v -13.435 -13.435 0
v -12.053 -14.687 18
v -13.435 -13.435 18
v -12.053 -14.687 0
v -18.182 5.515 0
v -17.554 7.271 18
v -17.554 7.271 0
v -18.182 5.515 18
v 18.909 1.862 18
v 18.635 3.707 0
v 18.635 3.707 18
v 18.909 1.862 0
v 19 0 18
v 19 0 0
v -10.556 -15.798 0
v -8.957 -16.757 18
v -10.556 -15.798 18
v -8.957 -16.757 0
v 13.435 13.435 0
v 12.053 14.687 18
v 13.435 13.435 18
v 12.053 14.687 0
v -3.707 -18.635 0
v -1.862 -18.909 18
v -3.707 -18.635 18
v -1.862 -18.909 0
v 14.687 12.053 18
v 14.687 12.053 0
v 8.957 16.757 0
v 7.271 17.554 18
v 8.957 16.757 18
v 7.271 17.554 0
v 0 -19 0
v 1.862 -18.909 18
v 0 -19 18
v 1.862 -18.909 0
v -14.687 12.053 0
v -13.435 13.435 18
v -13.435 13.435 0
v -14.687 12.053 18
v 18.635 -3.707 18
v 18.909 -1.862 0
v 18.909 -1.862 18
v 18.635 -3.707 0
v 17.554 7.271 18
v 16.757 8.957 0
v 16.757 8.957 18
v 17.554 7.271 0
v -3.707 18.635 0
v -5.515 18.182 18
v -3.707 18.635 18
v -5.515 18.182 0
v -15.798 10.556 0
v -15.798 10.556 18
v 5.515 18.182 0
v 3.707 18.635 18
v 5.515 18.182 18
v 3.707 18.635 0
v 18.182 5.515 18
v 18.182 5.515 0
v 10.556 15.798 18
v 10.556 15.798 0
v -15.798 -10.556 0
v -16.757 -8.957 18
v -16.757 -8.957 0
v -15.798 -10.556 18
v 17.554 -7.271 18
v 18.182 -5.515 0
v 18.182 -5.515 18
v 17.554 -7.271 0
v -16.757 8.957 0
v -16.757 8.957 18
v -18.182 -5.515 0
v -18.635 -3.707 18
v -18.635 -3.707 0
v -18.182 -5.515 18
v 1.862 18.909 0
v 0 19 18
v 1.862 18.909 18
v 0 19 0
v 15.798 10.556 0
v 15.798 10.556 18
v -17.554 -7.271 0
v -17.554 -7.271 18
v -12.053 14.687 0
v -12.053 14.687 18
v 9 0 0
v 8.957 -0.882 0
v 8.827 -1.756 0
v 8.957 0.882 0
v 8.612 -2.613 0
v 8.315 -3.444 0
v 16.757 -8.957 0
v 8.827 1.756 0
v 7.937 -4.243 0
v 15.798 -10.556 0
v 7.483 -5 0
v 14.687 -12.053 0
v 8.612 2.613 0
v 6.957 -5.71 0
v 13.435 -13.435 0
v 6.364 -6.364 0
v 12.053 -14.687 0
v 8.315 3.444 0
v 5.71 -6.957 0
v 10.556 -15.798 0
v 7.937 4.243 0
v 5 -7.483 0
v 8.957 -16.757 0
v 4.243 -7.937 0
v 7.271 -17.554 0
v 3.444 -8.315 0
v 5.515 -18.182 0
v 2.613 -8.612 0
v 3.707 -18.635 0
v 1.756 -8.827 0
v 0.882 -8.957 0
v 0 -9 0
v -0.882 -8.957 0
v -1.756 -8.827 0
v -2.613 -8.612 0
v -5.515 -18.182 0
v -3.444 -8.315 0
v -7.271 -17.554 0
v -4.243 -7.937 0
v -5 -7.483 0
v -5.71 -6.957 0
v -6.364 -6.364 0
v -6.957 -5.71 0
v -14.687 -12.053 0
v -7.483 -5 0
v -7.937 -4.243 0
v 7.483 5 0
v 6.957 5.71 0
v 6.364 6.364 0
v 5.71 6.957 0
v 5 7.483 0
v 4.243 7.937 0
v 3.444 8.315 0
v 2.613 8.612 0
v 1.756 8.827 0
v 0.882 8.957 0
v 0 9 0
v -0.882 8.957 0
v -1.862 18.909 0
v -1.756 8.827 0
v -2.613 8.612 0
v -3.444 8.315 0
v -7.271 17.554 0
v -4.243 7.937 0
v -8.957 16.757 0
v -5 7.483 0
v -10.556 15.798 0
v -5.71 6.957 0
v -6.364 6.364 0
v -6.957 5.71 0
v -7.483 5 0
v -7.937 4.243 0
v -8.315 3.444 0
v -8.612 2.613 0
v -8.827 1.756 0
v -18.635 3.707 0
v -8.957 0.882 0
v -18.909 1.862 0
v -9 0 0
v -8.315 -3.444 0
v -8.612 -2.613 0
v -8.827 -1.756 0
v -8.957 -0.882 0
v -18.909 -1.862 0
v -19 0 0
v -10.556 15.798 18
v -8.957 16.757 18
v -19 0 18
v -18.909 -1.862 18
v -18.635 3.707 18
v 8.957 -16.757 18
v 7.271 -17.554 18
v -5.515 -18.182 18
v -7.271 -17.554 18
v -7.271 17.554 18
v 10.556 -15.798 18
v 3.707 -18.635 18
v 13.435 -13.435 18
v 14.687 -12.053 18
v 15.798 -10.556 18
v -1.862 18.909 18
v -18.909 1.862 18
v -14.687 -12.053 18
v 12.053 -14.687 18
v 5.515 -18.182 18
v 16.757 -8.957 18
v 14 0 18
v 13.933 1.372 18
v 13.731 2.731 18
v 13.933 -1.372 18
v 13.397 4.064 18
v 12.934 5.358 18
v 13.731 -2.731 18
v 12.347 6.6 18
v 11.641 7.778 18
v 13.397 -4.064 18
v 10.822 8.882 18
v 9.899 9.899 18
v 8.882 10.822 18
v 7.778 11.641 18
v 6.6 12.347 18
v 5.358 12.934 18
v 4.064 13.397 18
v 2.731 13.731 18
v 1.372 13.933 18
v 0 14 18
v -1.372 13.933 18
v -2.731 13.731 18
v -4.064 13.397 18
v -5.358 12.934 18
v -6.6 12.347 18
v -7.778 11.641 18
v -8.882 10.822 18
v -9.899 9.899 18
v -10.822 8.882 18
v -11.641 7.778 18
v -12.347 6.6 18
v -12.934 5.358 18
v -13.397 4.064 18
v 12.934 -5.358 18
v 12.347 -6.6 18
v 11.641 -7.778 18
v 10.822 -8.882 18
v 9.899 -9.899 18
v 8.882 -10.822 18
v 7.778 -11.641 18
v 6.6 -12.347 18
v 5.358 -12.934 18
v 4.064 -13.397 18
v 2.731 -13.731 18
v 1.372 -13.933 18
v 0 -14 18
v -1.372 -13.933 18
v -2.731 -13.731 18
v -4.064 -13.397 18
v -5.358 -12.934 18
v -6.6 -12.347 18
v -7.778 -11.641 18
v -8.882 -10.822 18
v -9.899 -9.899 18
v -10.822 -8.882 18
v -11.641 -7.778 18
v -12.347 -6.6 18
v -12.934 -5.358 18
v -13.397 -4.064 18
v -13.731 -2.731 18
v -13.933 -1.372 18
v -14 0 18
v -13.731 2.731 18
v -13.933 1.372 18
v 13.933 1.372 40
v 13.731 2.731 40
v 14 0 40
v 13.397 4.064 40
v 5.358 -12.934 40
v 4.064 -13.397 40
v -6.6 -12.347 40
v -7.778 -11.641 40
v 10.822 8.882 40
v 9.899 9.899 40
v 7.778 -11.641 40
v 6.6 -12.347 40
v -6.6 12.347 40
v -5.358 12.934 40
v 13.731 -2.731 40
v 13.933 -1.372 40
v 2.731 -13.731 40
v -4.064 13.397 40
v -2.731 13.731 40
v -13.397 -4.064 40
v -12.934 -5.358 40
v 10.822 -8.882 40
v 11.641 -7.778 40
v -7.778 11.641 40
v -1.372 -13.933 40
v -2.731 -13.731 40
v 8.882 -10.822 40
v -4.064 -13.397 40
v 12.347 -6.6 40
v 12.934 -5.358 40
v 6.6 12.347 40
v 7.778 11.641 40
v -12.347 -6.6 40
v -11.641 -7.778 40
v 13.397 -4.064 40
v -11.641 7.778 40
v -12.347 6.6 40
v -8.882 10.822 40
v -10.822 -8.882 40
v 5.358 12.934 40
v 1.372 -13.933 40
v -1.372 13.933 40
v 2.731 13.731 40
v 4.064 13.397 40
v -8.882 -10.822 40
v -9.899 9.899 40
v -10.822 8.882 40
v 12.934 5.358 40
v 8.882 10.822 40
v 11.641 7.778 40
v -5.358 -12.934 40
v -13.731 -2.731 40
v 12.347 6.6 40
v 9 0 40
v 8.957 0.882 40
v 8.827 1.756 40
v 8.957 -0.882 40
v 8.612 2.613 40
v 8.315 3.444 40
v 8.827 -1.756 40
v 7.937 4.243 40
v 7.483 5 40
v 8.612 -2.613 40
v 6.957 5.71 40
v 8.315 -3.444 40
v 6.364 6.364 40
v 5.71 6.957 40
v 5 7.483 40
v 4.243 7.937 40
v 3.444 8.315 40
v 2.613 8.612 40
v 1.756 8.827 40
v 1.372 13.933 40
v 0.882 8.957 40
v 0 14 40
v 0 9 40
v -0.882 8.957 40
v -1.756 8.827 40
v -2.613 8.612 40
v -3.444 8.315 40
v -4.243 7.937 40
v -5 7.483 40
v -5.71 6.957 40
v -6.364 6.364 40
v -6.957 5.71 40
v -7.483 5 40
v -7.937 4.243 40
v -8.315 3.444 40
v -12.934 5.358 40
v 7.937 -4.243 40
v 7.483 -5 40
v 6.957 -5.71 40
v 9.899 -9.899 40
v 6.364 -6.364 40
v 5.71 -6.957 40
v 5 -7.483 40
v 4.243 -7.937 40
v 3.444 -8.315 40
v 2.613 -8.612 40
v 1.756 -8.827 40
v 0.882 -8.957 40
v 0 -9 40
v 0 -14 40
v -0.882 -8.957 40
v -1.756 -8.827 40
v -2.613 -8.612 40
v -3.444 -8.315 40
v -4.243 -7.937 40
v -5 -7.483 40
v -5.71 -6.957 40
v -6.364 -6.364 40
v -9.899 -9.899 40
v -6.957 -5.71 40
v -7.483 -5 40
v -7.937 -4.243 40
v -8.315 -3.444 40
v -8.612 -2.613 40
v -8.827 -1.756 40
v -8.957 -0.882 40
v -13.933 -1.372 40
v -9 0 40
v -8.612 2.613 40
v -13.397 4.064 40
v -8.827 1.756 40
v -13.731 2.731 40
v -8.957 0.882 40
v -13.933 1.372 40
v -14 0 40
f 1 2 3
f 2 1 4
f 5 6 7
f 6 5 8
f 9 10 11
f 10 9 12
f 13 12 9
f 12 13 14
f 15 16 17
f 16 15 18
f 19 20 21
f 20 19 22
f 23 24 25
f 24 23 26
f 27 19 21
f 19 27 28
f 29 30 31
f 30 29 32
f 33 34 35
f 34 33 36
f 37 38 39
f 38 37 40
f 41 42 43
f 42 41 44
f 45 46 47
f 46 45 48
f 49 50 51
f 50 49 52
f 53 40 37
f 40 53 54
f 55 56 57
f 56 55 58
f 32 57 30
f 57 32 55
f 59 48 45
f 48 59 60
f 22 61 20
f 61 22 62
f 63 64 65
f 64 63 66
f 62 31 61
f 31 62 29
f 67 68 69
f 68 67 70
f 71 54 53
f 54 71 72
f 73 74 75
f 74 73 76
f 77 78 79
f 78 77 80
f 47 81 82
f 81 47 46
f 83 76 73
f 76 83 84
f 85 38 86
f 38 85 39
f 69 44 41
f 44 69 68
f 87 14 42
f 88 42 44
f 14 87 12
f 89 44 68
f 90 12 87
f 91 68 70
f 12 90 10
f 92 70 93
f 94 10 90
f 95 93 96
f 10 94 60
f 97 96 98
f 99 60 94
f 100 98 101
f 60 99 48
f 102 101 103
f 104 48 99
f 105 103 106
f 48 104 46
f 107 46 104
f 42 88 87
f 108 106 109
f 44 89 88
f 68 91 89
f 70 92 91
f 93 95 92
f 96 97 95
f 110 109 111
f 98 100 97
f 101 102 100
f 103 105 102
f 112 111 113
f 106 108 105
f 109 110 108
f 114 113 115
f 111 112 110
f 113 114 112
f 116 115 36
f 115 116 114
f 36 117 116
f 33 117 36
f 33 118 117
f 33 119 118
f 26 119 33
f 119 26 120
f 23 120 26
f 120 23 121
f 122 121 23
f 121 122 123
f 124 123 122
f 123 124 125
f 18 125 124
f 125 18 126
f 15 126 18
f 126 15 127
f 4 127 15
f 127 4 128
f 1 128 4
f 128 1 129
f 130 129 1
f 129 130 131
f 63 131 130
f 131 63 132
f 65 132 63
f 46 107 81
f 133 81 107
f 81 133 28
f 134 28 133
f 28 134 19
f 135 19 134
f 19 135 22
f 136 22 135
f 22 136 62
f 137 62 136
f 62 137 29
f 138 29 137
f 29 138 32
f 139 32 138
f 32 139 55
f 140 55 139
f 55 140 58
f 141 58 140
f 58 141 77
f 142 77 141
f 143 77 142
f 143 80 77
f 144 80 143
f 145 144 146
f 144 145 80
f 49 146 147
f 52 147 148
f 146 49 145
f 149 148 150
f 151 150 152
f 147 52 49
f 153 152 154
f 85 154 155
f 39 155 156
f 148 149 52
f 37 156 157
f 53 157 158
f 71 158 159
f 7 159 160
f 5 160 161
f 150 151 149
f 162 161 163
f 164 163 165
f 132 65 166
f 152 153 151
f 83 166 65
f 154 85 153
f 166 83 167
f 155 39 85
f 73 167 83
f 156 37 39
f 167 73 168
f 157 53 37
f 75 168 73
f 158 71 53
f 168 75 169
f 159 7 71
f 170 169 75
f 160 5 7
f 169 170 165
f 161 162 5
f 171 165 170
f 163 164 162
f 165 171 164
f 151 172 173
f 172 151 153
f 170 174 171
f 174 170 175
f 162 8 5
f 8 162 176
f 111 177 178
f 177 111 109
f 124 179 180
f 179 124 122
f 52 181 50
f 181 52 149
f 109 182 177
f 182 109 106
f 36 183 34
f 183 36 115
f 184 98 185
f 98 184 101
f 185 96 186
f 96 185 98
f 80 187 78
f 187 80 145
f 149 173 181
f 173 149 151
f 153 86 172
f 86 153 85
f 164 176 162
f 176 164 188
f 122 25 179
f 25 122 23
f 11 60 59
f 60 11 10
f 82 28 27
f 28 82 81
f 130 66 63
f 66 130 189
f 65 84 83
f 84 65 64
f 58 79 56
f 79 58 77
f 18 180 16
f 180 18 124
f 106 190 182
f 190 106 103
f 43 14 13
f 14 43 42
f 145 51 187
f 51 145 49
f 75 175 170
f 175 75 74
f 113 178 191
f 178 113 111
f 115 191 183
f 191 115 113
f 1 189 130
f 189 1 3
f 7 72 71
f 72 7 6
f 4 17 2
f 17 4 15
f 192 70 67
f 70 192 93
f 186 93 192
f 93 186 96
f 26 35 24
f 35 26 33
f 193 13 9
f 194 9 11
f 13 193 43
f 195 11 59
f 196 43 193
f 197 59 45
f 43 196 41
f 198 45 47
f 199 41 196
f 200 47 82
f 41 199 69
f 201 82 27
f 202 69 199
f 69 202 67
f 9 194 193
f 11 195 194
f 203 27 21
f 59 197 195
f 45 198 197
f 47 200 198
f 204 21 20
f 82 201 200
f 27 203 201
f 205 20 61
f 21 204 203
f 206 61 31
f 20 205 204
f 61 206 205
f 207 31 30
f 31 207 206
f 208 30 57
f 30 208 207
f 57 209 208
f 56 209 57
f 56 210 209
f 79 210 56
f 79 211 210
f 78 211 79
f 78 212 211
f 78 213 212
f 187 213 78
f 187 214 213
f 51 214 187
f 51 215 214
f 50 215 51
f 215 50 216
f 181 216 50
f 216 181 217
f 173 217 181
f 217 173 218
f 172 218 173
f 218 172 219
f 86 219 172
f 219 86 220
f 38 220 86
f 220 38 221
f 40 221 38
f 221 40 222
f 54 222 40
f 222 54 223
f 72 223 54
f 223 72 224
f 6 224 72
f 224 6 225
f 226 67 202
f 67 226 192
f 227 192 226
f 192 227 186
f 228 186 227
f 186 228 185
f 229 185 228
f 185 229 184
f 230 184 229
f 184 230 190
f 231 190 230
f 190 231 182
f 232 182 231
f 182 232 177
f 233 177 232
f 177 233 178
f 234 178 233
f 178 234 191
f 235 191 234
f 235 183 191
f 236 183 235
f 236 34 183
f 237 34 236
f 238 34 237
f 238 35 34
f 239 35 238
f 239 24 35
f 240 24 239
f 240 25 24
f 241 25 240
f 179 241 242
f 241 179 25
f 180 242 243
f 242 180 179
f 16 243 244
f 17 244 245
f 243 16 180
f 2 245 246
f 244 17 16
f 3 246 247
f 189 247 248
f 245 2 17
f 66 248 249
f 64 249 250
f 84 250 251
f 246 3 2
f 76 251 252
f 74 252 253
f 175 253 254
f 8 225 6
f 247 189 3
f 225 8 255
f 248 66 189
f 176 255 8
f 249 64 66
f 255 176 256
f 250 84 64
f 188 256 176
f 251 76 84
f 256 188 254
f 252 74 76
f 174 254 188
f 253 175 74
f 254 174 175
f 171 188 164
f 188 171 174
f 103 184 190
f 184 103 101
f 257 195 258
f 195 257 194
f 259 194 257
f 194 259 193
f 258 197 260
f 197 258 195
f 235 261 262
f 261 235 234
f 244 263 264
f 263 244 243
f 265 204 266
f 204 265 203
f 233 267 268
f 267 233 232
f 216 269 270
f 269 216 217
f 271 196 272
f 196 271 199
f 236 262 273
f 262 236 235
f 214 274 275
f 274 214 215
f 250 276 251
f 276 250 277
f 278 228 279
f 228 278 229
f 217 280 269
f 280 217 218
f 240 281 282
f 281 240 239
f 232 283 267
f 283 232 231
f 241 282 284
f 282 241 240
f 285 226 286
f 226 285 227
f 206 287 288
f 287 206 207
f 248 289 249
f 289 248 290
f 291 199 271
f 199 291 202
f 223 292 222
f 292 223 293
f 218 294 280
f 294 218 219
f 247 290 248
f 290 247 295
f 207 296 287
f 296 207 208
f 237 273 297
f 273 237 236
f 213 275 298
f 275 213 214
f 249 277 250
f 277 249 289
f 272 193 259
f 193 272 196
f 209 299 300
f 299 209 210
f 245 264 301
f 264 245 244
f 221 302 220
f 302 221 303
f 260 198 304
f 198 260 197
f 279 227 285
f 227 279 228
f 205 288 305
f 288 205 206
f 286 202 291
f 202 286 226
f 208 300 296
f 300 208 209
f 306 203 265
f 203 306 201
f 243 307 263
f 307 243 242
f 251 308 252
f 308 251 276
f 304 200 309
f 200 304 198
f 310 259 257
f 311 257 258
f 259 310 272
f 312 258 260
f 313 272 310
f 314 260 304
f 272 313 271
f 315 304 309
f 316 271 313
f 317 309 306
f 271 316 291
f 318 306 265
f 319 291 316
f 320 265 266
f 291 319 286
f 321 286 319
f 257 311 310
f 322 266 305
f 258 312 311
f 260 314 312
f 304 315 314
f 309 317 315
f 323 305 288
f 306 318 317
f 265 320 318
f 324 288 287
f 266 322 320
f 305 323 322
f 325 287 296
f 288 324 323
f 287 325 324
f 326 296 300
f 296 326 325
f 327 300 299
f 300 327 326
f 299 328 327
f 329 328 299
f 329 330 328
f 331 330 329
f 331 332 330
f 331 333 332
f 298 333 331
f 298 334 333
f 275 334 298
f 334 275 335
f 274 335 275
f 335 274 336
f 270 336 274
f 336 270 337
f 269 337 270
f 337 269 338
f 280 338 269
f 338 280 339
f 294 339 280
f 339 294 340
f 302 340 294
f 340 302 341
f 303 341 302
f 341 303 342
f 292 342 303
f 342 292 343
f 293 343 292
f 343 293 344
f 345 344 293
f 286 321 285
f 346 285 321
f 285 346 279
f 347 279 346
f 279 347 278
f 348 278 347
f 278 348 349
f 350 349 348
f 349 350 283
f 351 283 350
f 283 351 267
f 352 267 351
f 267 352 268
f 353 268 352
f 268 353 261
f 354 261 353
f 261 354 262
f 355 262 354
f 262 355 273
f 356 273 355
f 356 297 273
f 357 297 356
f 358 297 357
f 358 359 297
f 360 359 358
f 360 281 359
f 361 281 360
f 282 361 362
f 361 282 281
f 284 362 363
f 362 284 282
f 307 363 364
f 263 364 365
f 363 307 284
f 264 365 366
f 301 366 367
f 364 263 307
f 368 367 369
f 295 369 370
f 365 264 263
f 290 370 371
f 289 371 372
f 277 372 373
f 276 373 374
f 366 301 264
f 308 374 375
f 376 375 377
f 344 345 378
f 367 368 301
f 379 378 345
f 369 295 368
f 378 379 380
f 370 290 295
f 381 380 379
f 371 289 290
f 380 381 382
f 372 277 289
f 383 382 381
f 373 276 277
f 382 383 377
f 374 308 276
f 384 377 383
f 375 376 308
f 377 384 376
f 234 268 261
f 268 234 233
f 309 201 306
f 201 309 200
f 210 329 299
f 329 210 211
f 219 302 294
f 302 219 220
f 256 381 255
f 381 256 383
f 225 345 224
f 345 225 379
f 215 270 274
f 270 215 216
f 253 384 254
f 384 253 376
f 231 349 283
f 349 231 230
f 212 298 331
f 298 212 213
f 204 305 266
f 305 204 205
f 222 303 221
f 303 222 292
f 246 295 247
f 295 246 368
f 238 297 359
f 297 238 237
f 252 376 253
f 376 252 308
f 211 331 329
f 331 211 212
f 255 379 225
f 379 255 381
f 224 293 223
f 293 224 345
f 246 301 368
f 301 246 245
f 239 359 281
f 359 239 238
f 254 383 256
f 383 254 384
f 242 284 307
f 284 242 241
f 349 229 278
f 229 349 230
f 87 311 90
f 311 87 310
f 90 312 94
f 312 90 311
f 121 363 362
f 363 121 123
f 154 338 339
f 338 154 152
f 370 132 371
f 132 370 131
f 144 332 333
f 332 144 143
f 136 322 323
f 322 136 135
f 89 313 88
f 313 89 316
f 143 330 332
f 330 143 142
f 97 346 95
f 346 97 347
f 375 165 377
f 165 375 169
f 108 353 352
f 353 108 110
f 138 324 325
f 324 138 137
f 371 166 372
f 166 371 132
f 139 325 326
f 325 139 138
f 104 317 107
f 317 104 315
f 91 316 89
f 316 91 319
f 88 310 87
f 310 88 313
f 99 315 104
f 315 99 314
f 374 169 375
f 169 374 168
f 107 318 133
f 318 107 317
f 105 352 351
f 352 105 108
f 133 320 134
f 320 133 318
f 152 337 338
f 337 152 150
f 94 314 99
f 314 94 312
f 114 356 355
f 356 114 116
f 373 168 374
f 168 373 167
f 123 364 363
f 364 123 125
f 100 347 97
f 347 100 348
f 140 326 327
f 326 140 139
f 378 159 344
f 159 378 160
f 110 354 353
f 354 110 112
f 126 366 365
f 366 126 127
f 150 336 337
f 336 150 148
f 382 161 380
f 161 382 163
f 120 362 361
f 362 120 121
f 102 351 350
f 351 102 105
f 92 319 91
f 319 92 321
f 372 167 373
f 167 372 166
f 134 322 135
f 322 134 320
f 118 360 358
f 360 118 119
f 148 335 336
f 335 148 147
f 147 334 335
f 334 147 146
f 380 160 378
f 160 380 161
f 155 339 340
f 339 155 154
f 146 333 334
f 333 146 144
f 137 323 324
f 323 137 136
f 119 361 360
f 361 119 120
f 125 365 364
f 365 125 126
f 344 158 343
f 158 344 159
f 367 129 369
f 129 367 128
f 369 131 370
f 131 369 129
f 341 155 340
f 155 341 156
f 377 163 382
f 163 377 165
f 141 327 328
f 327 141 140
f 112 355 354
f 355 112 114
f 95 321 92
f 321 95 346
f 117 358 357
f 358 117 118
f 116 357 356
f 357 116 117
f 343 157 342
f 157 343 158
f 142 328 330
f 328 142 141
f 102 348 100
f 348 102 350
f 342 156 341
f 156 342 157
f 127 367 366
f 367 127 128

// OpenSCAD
// Starter connector for task-004.
$fn = 64;

lower_od = 38;
upper_od = 28;
lower_height = 18;
total_height = 40;
bore_diameter = 18;

difference() {
  union() {
    cylinder(h = lower_height, r = lower_od / 2);
    translate([0, 0, lower_height])
      cylinder(h = total_height - lower_height, r = upper_od / 2);
  }

  translate([0, 0, -1])
    cylinder(h = total_height + 2, r = bore_diameter / 2);
}
